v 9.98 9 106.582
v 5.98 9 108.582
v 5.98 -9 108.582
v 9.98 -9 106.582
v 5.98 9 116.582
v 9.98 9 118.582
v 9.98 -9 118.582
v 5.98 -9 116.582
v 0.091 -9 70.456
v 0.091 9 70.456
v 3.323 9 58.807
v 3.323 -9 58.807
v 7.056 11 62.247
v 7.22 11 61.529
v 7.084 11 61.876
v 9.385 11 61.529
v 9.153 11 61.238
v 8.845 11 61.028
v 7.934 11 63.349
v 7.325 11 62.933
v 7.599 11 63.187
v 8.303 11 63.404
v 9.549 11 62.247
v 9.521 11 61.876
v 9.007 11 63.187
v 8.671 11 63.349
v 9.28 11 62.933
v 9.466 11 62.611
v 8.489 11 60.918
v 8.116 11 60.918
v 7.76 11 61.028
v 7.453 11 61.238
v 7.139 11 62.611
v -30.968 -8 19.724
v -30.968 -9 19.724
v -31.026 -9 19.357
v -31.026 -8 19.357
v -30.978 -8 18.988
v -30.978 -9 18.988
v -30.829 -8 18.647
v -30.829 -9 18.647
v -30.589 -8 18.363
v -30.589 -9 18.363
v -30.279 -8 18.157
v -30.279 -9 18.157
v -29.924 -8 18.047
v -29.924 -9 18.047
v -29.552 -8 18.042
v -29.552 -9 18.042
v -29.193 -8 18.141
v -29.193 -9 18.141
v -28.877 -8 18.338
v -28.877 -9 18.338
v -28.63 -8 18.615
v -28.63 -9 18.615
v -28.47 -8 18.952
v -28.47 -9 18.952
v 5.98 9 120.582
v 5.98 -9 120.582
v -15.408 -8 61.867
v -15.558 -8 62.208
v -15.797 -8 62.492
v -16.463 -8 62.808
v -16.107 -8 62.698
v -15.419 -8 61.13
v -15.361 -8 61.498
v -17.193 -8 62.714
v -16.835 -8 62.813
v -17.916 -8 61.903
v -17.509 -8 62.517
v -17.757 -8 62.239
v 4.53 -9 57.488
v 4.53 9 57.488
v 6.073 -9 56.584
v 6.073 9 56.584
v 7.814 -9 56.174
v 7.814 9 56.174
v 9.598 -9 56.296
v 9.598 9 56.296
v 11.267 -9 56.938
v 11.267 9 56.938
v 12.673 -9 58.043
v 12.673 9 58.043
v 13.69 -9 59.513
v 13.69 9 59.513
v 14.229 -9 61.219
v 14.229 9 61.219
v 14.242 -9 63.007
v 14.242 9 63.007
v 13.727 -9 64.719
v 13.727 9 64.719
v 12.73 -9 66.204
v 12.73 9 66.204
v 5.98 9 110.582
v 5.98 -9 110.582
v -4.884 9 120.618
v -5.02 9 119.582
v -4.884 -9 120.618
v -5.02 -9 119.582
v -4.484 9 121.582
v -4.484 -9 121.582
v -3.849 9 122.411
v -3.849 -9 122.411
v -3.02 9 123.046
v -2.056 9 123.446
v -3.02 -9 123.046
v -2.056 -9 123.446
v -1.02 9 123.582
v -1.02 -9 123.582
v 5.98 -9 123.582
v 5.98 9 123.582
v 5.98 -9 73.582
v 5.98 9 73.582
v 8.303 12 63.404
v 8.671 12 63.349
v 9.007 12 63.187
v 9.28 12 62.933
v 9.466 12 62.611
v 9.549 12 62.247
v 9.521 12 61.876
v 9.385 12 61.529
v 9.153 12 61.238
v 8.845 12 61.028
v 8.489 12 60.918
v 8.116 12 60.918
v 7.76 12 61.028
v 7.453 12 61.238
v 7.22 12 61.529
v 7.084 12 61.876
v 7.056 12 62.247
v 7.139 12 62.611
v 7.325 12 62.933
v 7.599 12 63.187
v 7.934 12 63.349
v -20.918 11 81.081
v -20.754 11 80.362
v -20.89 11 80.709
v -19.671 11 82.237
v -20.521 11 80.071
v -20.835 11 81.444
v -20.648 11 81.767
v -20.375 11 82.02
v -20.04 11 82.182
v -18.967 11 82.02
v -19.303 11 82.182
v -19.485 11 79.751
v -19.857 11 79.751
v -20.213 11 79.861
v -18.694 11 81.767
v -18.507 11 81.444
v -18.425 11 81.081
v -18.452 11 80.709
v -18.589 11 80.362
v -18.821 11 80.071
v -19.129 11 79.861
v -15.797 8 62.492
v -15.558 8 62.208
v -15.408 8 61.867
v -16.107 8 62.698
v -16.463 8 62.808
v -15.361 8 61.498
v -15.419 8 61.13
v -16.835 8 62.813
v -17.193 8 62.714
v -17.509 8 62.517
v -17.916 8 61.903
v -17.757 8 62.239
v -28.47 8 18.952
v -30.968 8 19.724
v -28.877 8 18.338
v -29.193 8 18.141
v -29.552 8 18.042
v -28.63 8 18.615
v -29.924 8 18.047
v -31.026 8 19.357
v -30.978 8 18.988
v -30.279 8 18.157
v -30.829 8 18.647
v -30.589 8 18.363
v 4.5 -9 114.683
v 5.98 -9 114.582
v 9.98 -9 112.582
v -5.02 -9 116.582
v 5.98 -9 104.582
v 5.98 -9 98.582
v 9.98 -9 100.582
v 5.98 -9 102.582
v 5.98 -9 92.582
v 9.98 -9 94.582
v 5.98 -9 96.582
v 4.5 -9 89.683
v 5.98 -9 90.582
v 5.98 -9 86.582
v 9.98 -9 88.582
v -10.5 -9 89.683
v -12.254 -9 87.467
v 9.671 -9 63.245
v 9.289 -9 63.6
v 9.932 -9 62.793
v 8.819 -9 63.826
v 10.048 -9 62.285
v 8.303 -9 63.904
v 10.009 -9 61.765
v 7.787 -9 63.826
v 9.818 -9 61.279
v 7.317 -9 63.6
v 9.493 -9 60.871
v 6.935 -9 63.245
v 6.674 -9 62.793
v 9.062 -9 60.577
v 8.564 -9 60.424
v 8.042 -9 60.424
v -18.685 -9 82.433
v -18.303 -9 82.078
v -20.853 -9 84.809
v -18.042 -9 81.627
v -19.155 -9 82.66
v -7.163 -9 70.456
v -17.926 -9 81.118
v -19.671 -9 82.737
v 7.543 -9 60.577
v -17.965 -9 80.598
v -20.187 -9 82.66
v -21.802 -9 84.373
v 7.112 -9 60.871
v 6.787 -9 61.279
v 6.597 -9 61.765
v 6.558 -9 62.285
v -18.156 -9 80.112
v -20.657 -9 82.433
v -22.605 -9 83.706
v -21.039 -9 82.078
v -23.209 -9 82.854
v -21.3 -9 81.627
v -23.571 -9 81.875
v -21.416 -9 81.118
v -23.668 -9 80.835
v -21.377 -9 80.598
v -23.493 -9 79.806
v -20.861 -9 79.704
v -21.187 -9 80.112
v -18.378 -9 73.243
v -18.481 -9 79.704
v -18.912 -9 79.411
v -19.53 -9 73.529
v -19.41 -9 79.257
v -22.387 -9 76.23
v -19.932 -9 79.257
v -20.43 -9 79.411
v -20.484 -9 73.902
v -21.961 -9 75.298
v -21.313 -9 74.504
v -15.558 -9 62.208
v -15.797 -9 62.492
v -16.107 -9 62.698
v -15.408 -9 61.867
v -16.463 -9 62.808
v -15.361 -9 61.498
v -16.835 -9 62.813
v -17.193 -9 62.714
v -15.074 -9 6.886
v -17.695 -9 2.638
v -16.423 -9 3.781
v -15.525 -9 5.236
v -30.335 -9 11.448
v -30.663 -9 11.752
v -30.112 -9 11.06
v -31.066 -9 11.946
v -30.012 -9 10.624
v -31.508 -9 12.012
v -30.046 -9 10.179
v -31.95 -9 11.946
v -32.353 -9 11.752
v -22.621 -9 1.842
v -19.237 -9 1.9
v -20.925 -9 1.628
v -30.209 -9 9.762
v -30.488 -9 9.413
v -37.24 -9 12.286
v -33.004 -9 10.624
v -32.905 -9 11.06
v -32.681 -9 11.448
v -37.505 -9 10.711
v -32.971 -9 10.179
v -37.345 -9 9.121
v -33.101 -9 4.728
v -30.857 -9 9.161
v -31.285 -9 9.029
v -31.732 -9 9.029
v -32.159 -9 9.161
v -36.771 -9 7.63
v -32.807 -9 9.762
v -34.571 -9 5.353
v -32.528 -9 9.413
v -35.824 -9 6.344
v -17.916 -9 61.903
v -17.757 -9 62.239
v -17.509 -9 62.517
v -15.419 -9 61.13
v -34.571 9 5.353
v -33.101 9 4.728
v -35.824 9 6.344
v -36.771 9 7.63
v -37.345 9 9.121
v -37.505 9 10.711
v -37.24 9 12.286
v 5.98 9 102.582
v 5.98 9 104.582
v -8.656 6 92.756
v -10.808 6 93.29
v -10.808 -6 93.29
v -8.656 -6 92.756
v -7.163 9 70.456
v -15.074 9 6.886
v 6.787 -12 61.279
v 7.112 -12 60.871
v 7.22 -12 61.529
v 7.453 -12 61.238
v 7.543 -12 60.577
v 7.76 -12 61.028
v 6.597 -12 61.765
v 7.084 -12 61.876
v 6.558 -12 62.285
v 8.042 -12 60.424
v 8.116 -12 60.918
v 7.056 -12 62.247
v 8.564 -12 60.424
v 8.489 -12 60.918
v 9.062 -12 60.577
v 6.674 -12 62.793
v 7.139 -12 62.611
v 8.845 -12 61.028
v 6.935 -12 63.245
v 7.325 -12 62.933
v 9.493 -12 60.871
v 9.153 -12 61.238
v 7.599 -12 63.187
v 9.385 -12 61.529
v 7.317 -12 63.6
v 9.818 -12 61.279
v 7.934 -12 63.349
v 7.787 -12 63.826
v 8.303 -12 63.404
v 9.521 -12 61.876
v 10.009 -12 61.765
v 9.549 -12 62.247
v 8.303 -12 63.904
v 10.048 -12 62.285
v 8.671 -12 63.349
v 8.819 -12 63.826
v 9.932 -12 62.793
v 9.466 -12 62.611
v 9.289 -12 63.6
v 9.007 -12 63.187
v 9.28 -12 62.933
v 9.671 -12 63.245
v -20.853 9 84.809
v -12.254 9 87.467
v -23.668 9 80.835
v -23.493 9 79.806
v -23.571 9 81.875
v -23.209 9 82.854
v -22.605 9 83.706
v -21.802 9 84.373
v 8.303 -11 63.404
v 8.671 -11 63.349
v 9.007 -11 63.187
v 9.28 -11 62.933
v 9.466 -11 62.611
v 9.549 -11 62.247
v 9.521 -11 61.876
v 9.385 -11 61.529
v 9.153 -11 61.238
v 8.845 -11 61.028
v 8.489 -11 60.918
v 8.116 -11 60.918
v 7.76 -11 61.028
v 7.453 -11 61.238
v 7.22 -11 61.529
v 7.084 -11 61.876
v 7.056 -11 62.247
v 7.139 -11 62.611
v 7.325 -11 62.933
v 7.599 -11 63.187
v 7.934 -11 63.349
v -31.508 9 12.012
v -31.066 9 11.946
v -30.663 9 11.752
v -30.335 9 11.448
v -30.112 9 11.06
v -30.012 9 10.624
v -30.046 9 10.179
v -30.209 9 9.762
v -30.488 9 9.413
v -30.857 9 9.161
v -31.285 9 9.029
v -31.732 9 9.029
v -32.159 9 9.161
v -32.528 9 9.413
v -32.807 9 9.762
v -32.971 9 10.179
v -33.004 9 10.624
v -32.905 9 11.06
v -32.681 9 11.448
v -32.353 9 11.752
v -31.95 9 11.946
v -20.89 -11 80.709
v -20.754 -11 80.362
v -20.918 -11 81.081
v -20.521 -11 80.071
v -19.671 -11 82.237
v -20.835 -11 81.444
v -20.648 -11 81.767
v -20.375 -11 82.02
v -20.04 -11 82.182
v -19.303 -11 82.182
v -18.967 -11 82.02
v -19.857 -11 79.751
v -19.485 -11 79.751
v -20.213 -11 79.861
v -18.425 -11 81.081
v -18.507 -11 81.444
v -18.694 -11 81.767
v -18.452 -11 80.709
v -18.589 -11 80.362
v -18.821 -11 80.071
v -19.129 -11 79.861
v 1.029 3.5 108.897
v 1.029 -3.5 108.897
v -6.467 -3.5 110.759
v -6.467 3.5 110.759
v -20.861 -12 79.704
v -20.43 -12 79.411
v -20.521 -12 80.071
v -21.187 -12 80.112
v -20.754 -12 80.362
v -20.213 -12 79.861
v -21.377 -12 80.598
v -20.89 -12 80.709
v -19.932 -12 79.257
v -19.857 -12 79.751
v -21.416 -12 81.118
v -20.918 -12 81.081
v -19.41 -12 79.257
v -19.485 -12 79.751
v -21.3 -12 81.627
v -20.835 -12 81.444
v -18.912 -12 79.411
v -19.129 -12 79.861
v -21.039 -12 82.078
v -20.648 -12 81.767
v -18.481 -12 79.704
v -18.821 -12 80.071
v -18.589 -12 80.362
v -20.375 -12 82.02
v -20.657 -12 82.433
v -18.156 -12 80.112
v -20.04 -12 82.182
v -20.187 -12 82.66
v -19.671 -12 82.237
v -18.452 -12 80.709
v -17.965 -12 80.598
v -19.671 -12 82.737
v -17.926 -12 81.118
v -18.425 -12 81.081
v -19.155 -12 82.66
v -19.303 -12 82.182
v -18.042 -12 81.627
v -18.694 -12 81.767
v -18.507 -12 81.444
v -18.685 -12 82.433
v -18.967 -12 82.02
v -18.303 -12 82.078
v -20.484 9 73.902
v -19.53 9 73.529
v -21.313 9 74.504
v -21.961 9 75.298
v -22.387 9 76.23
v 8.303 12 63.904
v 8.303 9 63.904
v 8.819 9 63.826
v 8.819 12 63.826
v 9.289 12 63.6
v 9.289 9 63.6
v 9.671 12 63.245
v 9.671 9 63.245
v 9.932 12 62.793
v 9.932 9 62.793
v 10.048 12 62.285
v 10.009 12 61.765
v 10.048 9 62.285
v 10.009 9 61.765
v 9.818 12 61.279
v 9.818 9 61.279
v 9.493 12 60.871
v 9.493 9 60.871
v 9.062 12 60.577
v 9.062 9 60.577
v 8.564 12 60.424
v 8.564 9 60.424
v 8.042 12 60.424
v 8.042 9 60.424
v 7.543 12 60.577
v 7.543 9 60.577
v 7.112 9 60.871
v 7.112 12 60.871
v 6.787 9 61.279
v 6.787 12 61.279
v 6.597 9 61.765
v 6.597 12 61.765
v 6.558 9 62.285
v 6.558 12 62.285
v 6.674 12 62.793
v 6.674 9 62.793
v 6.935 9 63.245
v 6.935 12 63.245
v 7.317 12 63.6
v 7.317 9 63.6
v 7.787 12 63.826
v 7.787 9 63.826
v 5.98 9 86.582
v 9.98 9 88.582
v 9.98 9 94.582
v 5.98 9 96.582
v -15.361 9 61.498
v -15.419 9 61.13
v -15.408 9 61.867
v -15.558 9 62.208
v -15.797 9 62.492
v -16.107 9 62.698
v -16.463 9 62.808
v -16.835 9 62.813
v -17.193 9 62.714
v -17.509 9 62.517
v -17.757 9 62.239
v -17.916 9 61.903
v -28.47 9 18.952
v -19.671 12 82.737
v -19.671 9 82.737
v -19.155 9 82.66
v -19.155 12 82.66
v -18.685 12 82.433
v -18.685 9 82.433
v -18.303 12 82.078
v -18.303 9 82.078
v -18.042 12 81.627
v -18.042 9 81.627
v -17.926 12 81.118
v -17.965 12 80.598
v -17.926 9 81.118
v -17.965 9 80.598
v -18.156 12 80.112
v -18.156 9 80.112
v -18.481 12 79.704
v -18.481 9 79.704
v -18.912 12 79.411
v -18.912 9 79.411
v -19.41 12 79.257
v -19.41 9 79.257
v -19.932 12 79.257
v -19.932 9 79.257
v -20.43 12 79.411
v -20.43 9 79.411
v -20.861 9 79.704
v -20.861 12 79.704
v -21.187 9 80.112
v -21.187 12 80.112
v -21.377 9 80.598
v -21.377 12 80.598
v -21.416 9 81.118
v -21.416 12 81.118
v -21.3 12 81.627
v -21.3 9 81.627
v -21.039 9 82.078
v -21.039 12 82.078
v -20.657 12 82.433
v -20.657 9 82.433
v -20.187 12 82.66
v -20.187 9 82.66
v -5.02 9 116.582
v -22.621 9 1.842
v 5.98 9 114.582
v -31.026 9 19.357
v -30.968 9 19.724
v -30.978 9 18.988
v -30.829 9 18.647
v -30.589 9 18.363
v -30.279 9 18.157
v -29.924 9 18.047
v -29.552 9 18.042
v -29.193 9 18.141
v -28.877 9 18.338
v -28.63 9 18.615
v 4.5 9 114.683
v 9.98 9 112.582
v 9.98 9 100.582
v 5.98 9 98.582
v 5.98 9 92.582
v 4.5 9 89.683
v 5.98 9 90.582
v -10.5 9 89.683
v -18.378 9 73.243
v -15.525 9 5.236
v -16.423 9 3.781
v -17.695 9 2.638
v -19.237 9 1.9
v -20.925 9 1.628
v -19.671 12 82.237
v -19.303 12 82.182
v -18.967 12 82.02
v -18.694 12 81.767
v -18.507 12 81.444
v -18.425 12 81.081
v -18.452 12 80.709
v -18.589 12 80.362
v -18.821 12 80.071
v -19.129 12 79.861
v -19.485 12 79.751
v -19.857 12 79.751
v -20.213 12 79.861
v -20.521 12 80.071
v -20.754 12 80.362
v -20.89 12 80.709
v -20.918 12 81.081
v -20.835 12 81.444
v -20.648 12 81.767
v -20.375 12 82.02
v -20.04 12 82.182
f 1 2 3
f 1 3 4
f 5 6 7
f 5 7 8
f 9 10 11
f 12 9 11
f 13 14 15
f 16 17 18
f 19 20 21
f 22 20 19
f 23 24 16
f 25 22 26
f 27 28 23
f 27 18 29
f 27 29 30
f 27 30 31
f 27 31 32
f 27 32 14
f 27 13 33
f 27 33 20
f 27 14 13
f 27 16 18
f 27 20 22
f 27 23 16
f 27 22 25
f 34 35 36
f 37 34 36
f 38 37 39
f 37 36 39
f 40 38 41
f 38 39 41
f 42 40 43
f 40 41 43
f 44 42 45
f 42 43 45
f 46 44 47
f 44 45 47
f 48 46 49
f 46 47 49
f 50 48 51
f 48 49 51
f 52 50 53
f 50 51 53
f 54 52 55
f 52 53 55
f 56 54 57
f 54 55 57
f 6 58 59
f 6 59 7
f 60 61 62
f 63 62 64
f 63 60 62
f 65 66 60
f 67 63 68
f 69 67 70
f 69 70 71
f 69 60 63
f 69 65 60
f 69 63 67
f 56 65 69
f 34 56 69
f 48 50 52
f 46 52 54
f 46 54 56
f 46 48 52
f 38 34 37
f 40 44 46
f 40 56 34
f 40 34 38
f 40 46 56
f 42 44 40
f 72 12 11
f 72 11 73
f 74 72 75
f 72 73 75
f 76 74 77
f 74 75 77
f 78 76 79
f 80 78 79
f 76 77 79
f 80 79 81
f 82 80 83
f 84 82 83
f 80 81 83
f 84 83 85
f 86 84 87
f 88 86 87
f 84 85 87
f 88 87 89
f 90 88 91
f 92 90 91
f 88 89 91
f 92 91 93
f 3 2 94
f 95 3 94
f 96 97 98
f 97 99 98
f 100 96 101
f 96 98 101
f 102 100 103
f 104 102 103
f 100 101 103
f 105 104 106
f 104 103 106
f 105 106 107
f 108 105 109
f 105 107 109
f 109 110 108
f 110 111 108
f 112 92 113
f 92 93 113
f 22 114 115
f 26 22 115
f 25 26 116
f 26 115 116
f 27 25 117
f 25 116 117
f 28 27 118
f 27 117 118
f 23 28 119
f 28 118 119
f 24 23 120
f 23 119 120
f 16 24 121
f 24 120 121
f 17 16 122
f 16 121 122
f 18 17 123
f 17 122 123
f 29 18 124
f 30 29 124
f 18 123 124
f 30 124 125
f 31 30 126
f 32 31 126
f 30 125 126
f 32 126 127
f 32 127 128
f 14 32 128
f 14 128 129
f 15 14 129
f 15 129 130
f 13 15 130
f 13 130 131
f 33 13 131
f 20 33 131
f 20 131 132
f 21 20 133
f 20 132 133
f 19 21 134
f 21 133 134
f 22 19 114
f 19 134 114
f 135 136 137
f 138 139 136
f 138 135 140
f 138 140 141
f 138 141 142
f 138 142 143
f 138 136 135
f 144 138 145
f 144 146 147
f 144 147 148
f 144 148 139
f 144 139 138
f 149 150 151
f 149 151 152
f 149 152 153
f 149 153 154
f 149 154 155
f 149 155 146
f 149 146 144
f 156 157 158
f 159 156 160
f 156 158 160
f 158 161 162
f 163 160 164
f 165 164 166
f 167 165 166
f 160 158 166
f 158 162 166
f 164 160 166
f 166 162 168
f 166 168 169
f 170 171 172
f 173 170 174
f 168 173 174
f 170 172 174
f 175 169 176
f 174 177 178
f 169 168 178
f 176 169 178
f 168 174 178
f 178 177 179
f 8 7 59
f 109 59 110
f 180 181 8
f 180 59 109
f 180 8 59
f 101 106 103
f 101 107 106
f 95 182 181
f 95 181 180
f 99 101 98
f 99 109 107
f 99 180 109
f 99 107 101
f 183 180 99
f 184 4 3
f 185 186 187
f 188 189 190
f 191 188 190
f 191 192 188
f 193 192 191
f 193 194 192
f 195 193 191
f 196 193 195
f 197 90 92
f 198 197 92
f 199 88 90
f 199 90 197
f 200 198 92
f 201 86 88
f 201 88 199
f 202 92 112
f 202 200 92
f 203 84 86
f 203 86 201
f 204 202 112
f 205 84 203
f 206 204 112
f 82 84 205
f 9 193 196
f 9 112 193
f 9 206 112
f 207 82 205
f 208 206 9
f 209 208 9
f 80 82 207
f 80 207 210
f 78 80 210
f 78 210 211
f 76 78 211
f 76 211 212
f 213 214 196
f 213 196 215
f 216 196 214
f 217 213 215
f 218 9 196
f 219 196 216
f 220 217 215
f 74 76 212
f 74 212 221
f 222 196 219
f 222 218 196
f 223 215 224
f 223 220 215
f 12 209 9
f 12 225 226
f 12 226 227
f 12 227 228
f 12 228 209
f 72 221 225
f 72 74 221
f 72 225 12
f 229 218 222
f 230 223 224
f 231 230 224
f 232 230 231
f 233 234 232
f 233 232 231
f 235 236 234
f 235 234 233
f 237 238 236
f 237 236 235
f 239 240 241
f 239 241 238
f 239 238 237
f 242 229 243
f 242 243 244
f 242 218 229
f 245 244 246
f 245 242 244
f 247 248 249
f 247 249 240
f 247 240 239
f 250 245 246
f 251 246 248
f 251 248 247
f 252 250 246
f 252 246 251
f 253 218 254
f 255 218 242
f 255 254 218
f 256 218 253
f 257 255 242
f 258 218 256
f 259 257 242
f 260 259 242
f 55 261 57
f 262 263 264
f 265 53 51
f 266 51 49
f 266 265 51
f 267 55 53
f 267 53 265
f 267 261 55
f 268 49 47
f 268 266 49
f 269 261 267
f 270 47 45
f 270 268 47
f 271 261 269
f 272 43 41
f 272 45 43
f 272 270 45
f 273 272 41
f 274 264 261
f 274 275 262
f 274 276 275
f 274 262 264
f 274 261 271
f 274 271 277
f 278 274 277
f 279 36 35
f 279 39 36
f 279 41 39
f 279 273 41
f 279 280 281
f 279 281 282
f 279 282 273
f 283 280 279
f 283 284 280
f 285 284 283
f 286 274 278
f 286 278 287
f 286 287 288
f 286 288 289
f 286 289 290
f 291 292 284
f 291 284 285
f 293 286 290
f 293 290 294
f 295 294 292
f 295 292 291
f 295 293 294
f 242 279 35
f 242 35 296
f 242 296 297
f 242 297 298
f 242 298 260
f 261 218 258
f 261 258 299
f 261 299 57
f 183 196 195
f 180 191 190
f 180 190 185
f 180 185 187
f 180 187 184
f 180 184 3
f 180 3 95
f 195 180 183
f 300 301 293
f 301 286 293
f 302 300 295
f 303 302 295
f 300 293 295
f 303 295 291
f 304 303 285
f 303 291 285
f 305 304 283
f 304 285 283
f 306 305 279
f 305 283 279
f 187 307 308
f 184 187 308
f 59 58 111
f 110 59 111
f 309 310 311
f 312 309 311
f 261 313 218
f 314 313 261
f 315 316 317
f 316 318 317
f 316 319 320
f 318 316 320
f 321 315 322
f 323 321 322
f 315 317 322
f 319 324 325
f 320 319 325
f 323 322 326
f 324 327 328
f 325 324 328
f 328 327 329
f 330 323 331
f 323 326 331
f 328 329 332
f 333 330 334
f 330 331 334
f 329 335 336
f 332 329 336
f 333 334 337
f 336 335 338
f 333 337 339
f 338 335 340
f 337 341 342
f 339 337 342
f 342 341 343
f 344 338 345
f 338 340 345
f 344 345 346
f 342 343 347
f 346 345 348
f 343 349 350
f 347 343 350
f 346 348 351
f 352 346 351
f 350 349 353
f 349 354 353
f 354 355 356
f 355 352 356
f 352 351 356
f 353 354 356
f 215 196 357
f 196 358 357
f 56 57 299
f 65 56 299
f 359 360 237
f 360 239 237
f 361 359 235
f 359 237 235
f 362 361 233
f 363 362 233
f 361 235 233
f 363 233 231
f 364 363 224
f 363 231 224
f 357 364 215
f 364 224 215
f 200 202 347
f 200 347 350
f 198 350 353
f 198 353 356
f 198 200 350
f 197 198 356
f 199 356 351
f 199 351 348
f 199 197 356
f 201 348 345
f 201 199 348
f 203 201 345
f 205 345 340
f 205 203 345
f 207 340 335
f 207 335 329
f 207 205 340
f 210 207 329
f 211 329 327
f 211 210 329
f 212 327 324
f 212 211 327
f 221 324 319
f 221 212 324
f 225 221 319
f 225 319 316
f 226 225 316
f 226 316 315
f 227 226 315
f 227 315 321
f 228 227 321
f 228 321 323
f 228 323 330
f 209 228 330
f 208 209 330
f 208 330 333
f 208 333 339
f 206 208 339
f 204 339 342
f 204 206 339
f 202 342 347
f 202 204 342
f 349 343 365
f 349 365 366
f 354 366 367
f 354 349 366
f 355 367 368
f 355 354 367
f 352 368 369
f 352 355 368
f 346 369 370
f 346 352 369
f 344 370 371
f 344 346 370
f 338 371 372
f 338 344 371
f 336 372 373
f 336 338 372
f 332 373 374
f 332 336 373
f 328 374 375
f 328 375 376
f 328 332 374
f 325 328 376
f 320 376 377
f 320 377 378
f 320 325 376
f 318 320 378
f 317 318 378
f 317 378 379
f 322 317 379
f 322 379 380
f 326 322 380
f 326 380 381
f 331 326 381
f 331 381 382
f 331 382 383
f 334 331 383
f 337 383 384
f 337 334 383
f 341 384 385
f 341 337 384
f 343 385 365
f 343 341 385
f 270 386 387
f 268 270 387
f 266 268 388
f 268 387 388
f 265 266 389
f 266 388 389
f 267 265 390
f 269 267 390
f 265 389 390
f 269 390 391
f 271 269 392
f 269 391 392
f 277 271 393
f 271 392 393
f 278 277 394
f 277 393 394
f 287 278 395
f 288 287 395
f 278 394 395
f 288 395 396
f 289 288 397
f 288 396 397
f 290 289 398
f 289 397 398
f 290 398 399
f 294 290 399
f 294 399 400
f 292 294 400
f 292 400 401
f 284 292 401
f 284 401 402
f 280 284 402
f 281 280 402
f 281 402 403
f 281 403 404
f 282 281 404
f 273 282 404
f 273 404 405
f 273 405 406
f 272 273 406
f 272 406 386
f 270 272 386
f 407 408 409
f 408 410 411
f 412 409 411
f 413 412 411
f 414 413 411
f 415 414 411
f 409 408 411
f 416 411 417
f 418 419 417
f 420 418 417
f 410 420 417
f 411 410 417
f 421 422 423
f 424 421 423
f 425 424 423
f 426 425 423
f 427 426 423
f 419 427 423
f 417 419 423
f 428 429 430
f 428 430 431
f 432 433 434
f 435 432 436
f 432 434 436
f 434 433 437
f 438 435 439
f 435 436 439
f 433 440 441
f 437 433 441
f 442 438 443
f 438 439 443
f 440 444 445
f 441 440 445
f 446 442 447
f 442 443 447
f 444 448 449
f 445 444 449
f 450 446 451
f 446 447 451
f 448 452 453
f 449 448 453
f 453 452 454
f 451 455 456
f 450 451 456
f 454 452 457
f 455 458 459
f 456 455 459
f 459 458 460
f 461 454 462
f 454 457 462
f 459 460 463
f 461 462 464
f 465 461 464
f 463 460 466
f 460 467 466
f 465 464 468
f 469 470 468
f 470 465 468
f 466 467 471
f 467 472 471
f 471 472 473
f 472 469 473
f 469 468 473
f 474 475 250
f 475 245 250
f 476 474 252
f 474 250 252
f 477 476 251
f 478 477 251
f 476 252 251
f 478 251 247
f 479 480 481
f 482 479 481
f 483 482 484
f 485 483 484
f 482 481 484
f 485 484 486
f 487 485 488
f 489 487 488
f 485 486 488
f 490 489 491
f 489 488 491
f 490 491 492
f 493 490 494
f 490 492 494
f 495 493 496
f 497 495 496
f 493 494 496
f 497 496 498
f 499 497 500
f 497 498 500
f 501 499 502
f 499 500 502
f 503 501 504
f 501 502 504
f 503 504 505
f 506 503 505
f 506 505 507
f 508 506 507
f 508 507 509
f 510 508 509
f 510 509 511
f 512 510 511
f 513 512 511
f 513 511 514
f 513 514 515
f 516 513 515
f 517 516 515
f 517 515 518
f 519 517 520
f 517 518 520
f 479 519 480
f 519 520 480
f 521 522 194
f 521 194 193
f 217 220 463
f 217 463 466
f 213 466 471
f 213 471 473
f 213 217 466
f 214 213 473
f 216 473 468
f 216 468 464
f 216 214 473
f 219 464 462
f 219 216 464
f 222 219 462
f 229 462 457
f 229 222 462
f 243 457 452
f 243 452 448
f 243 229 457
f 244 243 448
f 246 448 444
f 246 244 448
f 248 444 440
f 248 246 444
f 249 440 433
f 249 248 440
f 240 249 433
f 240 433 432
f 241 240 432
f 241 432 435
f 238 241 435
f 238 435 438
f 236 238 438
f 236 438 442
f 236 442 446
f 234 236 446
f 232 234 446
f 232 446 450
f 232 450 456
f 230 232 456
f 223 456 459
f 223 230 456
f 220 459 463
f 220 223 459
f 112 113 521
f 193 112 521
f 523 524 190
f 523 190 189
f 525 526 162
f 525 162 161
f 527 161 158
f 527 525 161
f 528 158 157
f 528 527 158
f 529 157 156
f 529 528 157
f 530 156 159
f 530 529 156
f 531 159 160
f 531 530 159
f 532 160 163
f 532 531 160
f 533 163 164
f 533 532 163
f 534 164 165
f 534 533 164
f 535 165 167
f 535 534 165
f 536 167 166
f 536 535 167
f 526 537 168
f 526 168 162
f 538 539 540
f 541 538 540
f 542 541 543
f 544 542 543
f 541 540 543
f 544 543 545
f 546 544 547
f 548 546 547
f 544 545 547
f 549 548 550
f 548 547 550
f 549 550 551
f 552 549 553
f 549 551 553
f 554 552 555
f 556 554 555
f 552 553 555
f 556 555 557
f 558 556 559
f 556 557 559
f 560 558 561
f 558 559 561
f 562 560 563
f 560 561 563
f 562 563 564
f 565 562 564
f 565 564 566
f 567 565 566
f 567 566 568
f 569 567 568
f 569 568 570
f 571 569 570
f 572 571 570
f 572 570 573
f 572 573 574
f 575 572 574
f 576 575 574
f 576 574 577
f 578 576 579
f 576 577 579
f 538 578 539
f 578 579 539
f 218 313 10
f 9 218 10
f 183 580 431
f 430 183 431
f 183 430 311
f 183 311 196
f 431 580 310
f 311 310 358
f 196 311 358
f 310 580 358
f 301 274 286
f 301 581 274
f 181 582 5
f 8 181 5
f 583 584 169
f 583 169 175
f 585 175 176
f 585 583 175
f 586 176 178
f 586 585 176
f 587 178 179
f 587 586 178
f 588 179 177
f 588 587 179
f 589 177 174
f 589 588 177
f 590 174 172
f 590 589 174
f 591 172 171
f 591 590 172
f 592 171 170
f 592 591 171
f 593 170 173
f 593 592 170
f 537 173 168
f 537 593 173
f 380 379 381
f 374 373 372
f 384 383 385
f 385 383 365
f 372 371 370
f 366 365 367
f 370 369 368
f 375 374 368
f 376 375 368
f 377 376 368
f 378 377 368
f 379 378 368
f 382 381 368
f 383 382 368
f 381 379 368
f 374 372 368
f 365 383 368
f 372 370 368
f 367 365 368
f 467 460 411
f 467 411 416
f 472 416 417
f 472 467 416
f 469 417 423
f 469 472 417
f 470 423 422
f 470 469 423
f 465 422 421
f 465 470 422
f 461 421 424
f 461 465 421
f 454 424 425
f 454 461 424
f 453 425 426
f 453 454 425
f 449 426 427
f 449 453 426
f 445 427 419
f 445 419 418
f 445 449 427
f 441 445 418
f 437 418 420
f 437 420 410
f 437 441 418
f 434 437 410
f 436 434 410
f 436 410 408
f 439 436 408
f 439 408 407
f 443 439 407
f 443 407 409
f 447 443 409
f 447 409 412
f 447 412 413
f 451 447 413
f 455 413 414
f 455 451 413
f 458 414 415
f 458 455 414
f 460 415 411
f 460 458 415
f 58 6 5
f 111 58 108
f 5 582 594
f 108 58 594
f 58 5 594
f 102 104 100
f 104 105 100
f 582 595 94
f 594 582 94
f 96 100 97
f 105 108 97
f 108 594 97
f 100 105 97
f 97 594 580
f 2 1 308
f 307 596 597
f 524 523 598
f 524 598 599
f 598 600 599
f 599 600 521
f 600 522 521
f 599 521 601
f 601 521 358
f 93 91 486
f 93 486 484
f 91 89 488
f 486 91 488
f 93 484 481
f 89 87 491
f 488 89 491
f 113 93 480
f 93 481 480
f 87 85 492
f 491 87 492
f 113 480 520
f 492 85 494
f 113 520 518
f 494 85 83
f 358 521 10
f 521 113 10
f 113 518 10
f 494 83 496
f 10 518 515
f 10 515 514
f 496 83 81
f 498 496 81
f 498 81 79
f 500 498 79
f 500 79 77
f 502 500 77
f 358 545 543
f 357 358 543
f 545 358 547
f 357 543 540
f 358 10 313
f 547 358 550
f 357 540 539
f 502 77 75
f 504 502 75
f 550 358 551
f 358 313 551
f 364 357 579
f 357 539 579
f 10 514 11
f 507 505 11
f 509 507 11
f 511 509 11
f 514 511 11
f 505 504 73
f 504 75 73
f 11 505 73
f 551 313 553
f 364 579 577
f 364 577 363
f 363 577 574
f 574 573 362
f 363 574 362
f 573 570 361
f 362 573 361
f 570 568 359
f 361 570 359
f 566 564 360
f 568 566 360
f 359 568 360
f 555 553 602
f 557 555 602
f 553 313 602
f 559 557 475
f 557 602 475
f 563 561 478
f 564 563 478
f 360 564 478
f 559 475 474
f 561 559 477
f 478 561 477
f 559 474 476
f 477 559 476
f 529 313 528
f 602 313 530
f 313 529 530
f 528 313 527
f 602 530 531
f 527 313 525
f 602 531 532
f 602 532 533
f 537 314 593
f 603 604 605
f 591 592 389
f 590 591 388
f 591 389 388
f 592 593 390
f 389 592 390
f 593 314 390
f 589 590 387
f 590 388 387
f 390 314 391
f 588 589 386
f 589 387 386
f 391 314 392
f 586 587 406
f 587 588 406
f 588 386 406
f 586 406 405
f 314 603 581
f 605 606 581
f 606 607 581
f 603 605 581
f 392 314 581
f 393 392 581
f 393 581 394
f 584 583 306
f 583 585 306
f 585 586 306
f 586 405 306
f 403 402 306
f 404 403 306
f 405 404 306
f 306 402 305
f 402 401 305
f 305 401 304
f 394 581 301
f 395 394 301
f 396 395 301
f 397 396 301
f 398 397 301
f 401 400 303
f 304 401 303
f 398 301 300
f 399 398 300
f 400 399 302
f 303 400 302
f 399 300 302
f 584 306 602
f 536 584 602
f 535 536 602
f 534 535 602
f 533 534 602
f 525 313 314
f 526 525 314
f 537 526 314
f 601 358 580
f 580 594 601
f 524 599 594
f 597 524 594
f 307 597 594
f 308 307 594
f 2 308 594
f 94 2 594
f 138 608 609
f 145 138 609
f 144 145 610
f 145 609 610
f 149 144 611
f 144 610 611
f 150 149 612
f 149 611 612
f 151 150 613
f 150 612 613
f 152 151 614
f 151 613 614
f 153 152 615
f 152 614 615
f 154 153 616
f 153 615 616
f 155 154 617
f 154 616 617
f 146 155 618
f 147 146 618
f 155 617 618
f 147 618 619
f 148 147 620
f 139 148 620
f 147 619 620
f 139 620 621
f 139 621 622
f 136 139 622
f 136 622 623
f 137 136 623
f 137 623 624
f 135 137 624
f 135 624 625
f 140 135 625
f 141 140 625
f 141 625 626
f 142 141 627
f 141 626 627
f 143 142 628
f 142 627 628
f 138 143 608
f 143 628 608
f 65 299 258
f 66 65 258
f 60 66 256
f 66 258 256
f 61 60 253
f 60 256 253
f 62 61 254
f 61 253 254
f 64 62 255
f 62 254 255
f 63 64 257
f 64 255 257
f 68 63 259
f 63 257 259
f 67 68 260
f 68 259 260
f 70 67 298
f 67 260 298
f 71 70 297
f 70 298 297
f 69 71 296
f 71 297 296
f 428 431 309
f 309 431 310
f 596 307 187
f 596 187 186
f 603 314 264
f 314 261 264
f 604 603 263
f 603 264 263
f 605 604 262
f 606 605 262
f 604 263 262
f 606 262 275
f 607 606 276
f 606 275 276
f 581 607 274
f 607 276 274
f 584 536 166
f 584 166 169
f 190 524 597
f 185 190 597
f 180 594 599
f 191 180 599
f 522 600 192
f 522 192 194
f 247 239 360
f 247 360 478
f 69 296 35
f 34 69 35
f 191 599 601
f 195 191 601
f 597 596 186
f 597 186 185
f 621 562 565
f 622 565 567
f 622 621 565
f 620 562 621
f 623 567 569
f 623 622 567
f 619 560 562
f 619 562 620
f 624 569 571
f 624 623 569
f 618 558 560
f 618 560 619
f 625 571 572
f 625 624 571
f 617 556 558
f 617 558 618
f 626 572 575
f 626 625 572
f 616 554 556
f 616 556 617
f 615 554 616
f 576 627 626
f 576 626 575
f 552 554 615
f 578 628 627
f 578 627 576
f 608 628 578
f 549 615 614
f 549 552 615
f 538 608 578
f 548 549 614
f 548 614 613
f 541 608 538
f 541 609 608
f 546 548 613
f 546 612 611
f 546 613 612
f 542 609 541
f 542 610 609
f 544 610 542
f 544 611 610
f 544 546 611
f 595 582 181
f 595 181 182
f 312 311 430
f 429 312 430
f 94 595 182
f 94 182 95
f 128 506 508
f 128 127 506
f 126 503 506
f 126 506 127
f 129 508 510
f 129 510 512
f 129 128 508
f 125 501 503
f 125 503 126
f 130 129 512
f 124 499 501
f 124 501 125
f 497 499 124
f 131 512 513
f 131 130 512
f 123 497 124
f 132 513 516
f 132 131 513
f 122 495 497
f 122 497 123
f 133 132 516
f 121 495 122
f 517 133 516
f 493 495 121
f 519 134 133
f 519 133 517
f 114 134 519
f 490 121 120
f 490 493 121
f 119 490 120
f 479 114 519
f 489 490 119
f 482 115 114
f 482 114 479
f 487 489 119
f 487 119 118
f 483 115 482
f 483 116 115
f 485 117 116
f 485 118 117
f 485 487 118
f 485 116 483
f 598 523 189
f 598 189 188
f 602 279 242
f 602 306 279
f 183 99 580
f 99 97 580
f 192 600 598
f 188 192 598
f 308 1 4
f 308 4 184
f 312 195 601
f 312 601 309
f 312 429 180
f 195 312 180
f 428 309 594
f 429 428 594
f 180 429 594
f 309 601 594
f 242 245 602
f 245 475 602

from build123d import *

# Parameters (mm, degrees)
BOSS_EXTRU_1_DEPTH         = 9
CONG_1_R                   = 6
CONG_2_R                   = 4
BOSS_EXTRU_2_DEPTH         = 18
R_P_TITION_LIN_AIRE1_COUNT = 6
R_P_TITION_LIN_AIRE1_PITCH = 6
ENL_V_MAT_EXTRU_1_DEPTH    = 131.397228353
ENL_V_MAT_EXTRU_2_DEPTH    = 10
ESQUISSE5_R                = 1.5
ENL_V_MAT_EXTRU_3_DEPTH    = 131.397228353
ESQUISSE7_R                = 1.75
BOSS_EXTRU_3_DEPTH         = 3
ESQUISSE8_R                = 1.25
ENL_V_MAT_EXTRU_4_DEPTH    = 1
ESQUISSE9_R                = 1.25
ENL_V_MAT_EXTRU_5_DEPTH    = 1
ENL_V_MAT_EXTRU_6_DEPTH    = 1


with BuildPart() as part:
    # Esquisse1 → Boss.-Extru.1 (new, symmetric)
    with BuildSketch(Plane(origin=(0, 0, 0), x_dir=(1, 0, 0), z_dir=(0, 1, 0))):
        with BuildLine():
            ThreePointArc((3.322818072, -58.807369293), (12.01141452, -57.437534528), (12.729634722, -66.204079757))
            Line((12.729634722, -66.204079757), (5.979619104, -73.58224275))
            Line((5.979619104, -73.58224275), (5.979619104, -123.58224275))
            Line((5.979619104, -123.58224275), (-5.020380896, -123.58224275))
            Line((-5.020380896, -123.58224275), (-5.020380896, -116.58224275))
            Line((-5.020380896, -116.58224275), (-12.254374663, -87.467481302))
            Line((-12.254374663, -87.467481302), (-24.674189245, -83.627142028))
            Line((-24.674189245, -83.627142028), (-21.720082111, -74.073438503))
            Line((-21.720082111, -74.073438503), (-7.162701387, -70.45644162))
            Line((-7.162701387, -70.45644162), (0.090794599, -70.45644162))
            Line((0.090794599, -70.45644162), (3.322818072, -58.807369293))
        make_face()
        Polygon((-7.162701387, -70.45644162), (-15.931386255, 0), (-39.070246498, -6.371275122), (-18.378388293, -73.243145172), align=None)
    extrude(amount=BOSS_EXTRU_1_DEPTH, both=True)

    # Congé1
    cong_1_edges = [part.edges().sort_by_distance(p)[0] for p in [
        (-39.070246498, 0, 6.371275122),
        (-15.931386255, 0, 0),
    ]]
    fillet(cong_1_edges, radius=CONG_1_R)

    # Congé2
    cong_2_edges = [part.edges().sort_by_distance(p)[0] for p in [
        (-5.020380896, 0, 123.58224275),
        (-24.674189245, 0, 83.627142028),
        (-21.720082111, 0, 74.073438503),
    ]]
    fillet(cong_2_edges, radius=CONG_2_R)

    # Esquisse2 → Boss.-Extru.2 (add, through all)
    with BuildSketch(Plane(origin=(0, 9, 0), x_dir=(1, 0, 0), z_dir=(0, 1, 0))):
        Polygon((5.979619104, -116.58224275), (5.979619104, -118.58224275), (9.979619104, -118.58224275), align=None)
        Polygon((5.979619104, -118.58224275), (5.979619104, -120.58224275), (9.979619104, -118.58224275), align=None)
    boss_extru_2 = extrude(amount=-BOSS_EXTRU_2_DEPTH)

    # Répétition linéaire1: Boss.-Extru.2 ×6
    with Locations(*[(0, 0, -i * R_P_TITION_LIN_AIRE1_PITCH) for i in range(1, R_P_TITION_LIN_AIRE1_COUNT)]):
        add(boss_extru_2)

    # Esquisse3 → Enlèv. mat.-Extru.1 (cut, through all)
    with BuildSketch(Plane(origin=(0, 9, 0), x_dir=(1, 0, 0), z_dir=(0, 1, 0))):
        Polygon((4.500460605, -114.682587681), (4.500460605, -89.682587681), (-10.499539395, -89.682587681), align=None)
    extrude(amount=-ENL_V_MAT_EXTRU_1_DEPTH, mode=Mode.SUBTRACT)

    # Esquisse4 → Enlèv. mat.-Extru.2 (cut)
    with BuildSketch(Plane(origin=(-32.010787668, 0, 7.953554381), x_dir=(0.24113312555809657, 0, 0.9704920482716916), z_dir=(-0.9704920482716917, 0, 0.2411331255580966))):
        Polygon((87.931559422, 6), (87.931559422, -6), (105.931559422, -3.5), (105.931559422, 3.5), align=None)
    extrude(amount=-ENL_V_MAT_EXTRU_2_DEPTH, mode=Mode.SUBTRACT)

    # Esquisse5 → Enlèv. mat.-Extru.3 (cut, through all)
    with BuildSketch(Plane(origin=(0, 9, 0), x_dir=(1, 0, 0), z_dir=(0, 1, 0))):
        with Locations(Location((-31.508218287, -10.512370957, 0), (0, 0, 270))):
            Circle(ESQUISSE5_R)
    extrude(amount=-ENL_V_MAT_EXTRU_3_DEPTH, mode=Mode.SUBTRACT)

    # Esquisse7 → Boss.-Extru.3 (add)
    with BuildSketch(Plane(origin=(0, 9, 0), x_dir=(1, 0, 0), z_dir=(0, 1, 0))):
        with Locations(Location((-19.671064982, -80.987303471, 0), (0, 0, 270))):
            Circle(ESQUISSE7_R)
        with Locations(Location((8.302736926, -62.154070386, 0), (0, 0, 270))):
            Circle(ESQUISSE7_R)
    boss_extru_3 = extrude(amount=BOSS_EXTRU_3_DEPTH)

    # Esquisse8 → Enlèv. mat.-Extru.4 (cut)
    with BuildSketch(Plane(origin=(0, 12, 0), x_dir=(1, 0, 0), z_dir=(0, 1, 0))):
        with Locations(Location((-19.671064982, -80.987303471, 0), (0, 0, 270))):
            Circle(ESQUISSE8_R)
    enl_v_mat_extru_4 = extrude(amount=-ENL_V_MAT_EXTRU_4_DEPTH, mode=Mode.SUBTRACT)

    # Esquisse9 → Enlèv. mat.-Extru.5 (cut)
    with BuildSketch(Plane(origin=(0, 12, 0), x_dir=(1, 0, 0), z_dir=(0, 1, 0))):
        with Locations(Location((8.302736926, -62.154070386, 0), (0, 0, 270))):
            Circle(ESQUISSE9_R)
    enl_v_mat_extru_5 = extrude(amount=-ENL_V_MAT_EXTRU_5_DEPTH, mode=Mode.SUBTRACT)

    # Esquisse10 → Enlèv. mat.-Extru.6 (cut)
    with BuildSketch(Plane(origin=(0, 9, 0), x_dir=(1, 0, 0), z_dir=(0, 1, 0))):
        with BuildLine():
            Line((-28.470192989, -18.951500143), (-15.418940428, -61.130489417))
            ThreePointArc((-15.418940428, -61.130489417), (-16.281236664, -62.765523067), (-17.916270315, -61.903226831))
            Line((-17.916270315, -61.903226831), (-30.967522877, -19.724237556))
            ThreePointArc((-30.967522877, -19.724237556), (-30.10522664, -18.089203906), (-28.470192989, -18.951500143))
        make_face()
    enl_v_mat_extru_6 = extrude(amount=-ENL_V_MAT_EXTRU_6_DEPTH, mode=Mode.SUBTRACT)

    # Symétrie1: Boss.-Extru.3, Enlèv. mat.-Extru.4, Enlèv. mat.-Extru.5, Enlèv. mat.-Extru.6 across plane
    add(boss_extru_3.mirror(Plane.ZX))
    add(enl_v_mat_extru_4.mirror(Plane.ZX), mode=Mode.SUBTRACT)
    add(enl_v_mat_extru_5.mirror(Plane.ZX), mode=Mode.SUBTRACT)
    add(enl_v_mat_extru_6.mirror(Plane.ZX), mode=Mode.SUBTRACT)


solid = part.part
